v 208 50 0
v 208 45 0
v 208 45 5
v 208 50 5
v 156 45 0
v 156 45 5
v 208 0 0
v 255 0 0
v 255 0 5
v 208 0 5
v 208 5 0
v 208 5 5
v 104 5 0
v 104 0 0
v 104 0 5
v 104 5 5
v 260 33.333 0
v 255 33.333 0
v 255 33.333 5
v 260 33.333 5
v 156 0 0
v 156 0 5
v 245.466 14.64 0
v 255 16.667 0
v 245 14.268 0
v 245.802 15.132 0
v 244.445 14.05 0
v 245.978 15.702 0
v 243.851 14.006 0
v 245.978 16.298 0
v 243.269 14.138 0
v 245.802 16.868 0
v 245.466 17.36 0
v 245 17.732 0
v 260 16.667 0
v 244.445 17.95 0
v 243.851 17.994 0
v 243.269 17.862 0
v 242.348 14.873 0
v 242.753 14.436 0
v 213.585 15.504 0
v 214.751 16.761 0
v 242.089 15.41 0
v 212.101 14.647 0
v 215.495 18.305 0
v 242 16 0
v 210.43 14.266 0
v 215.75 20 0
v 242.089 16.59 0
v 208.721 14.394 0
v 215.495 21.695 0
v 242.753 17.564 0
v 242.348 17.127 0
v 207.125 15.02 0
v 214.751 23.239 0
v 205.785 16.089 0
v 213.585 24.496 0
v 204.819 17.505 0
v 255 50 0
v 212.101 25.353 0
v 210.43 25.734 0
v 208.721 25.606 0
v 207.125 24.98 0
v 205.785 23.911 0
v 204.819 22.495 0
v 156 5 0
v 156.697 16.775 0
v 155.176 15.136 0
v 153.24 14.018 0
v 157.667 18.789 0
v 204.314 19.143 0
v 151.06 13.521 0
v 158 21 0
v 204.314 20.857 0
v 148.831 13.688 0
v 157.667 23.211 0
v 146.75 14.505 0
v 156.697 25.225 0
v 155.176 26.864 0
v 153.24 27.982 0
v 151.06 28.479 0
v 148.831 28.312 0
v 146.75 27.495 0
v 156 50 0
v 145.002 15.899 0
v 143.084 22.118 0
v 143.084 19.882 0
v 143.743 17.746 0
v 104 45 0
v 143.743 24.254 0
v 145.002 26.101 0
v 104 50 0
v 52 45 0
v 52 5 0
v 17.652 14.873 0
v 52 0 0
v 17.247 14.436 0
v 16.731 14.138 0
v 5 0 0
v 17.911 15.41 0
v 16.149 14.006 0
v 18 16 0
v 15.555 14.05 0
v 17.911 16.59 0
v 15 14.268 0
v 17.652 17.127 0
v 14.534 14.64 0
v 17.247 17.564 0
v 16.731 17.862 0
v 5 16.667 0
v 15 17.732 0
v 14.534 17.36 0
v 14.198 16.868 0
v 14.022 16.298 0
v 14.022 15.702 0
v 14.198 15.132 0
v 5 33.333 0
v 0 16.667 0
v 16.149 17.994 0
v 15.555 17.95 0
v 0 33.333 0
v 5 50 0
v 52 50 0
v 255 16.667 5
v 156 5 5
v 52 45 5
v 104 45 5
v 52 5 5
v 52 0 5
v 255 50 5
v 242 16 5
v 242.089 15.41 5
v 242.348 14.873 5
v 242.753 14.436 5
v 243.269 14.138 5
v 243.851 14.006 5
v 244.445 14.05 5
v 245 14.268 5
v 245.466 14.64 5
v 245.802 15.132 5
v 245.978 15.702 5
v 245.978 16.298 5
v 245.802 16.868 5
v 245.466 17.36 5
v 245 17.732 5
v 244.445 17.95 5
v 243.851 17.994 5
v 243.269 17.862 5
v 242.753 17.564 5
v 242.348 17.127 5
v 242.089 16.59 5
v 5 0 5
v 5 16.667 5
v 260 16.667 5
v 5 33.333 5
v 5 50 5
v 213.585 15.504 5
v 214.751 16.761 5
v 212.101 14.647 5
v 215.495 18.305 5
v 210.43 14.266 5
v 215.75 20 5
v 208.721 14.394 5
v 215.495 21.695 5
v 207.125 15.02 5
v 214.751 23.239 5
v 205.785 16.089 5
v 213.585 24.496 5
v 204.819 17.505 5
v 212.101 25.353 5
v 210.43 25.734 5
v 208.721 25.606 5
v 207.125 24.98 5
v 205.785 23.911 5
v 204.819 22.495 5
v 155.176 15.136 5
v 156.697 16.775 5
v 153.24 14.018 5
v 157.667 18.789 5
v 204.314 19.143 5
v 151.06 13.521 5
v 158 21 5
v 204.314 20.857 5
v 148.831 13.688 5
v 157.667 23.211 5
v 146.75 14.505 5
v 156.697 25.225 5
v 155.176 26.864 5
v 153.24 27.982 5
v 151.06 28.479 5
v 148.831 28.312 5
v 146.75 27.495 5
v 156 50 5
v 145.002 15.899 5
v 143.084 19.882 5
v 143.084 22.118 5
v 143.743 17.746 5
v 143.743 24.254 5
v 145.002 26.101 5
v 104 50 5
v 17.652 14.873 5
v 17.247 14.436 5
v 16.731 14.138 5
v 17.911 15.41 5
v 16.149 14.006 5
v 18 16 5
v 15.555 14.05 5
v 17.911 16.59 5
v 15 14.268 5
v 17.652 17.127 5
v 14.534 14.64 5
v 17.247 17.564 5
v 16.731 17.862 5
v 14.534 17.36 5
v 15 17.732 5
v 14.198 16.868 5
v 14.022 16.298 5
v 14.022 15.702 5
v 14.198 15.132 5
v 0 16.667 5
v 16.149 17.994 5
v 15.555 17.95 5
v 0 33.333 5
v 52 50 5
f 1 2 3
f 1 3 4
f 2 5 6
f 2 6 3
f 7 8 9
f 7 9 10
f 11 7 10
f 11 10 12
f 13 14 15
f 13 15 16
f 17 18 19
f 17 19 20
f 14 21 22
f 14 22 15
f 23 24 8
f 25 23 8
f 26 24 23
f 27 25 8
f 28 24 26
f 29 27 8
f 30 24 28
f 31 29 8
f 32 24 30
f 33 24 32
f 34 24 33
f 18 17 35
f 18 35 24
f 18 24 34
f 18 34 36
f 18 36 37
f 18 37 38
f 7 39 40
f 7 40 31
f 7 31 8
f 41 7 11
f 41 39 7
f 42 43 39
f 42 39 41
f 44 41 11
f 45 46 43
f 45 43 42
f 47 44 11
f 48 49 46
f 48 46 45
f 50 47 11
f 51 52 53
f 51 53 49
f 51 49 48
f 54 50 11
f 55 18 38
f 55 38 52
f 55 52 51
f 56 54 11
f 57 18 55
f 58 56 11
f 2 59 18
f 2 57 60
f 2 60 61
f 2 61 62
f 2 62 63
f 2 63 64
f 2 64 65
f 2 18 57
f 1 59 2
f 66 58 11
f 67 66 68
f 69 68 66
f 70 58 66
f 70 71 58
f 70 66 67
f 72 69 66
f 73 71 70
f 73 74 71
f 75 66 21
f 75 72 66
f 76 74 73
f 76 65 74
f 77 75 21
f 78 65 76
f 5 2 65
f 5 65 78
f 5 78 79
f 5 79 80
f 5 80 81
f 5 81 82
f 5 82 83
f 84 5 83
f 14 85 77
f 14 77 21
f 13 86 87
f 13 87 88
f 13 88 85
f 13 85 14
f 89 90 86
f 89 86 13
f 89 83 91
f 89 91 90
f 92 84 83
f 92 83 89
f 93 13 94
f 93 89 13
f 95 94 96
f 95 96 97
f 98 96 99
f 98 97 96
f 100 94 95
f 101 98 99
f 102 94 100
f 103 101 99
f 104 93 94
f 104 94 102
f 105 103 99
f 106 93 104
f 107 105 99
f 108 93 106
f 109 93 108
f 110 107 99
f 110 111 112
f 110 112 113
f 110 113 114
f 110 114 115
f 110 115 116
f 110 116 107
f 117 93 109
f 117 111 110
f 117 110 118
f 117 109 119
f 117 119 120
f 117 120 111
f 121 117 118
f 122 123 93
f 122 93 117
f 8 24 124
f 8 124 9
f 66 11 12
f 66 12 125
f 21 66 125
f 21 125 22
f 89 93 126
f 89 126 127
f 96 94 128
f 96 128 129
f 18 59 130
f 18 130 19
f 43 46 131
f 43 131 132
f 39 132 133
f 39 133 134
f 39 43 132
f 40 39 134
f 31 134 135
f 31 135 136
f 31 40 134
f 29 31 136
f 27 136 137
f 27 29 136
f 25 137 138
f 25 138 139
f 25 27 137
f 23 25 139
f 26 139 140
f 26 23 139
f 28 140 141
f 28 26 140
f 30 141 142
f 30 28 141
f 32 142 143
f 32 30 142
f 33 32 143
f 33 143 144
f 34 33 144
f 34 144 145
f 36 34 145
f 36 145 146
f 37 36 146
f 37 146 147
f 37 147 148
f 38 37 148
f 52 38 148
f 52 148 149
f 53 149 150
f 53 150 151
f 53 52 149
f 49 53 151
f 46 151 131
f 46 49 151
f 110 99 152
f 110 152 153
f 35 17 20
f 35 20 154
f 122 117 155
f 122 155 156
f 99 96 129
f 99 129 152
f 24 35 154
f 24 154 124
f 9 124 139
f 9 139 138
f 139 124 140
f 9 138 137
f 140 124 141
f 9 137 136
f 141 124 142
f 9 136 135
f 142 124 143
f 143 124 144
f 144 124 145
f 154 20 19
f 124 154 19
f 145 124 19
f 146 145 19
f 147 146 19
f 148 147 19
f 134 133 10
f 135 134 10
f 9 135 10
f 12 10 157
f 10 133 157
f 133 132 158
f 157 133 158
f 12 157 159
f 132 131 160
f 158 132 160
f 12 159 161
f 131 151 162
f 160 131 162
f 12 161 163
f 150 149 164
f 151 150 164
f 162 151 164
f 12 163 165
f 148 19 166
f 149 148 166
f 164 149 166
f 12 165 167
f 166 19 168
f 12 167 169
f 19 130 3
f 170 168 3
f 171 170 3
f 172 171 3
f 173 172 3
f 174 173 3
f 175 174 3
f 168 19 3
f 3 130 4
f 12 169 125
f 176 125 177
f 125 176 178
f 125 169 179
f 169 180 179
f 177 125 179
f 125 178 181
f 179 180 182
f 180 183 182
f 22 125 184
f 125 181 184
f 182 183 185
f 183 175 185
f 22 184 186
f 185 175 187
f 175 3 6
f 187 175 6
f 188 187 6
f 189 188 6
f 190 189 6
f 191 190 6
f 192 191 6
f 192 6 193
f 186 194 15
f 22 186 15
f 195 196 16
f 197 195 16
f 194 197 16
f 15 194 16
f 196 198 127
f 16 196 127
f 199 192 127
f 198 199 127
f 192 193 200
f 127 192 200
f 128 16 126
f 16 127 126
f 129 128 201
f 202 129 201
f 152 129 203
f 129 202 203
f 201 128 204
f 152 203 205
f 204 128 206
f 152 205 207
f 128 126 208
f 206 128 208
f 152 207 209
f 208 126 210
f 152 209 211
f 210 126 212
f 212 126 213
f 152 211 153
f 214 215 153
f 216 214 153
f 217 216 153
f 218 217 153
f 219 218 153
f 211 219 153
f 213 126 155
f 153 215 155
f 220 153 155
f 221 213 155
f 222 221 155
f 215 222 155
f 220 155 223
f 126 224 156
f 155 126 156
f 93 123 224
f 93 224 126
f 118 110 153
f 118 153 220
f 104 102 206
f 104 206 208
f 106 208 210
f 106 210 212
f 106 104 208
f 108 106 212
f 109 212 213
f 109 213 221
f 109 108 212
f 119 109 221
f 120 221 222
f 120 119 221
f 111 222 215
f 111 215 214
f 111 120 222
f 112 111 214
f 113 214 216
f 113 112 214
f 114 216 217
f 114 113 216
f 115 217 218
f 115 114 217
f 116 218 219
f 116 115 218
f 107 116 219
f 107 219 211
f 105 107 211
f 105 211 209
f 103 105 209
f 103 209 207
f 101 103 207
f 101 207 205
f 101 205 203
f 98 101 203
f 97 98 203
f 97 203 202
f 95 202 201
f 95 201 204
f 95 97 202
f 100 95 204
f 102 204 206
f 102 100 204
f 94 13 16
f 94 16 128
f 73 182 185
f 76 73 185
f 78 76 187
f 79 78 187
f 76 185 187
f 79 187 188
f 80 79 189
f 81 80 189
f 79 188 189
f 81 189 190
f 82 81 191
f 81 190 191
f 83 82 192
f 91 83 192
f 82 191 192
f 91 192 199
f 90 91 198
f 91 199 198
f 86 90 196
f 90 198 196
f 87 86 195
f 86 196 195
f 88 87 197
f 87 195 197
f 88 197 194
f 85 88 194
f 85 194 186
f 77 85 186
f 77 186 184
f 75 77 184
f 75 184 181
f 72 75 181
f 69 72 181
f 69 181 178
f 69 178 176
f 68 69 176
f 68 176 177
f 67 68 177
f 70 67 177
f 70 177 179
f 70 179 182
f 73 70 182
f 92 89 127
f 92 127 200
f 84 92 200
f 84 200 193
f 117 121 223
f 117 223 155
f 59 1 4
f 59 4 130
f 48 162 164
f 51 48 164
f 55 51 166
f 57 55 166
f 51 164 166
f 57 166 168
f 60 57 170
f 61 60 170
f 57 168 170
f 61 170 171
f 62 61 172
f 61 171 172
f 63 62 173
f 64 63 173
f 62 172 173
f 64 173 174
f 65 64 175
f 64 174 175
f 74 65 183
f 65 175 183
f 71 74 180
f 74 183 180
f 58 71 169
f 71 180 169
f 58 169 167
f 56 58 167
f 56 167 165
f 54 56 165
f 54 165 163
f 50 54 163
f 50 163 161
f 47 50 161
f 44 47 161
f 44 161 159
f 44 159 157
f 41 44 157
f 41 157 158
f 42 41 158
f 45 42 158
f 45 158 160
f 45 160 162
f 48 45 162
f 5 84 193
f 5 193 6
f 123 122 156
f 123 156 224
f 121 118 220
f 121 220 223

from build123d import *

# Parameters (mm, degrees)
CROQUIS1_R              = 2
SALIENTE_EXTRUIR1_DEPTH = 5
CROQUIS2_R              = 5.75
CROQUIS2_R_2            = 7.5
CORTAR_EXTRUIR1_DEPTH   = 10


with BuildPart() as part:
    # Croquis1 → Saliente-Extruir1 (new body)
    with BuildSketch(Plane.XY):
        Polygon((0, 33.333333333), (5, 33.333333333), (5, 50), (52, 50), (52, 45), (104, 45), (104, 50), (156, 50), (156, 45), (208, 45), (208, 50), (255, 50), (255, 33.333333333), (260, 33.333333333), (260, 16.666666667), (255, 16.666666667), (255, 0), (208, 0), (208, 5), (156, 5), (156, 0), (104, 0), (104, 5), (52, 5), (52, 0), (5, 0), (5, 16.666666667), (0, 16.666666667), align=None)
        with Locations((16, 16)):
            Circle(CROQUIS1_R, mode=Mode.SUBTRACT)
        with Locations(Location((244, 16, 0), (0, 0, 180))):
            Circle(CROQUIS1_R, mode=Mode.SUBTRACT)
    extrude(amount=SALIENTE_EXTRUIR1_DEPTH)

    # Croquis2 → Cortar-Extruir1 (cut)
    with BuildSketch(Plane.XY.offset(5)):
        with Locations((210, 20)):
            Circle(CROQUIS2_R)
        with Locations((150.5, 21)):
            Circle(CROQUIS2_R_2)
    extrude(amount=-CORTAR_EXTRUIR1_DEPTH, mode=Mode.SUBTRACT)


solid = part.part
